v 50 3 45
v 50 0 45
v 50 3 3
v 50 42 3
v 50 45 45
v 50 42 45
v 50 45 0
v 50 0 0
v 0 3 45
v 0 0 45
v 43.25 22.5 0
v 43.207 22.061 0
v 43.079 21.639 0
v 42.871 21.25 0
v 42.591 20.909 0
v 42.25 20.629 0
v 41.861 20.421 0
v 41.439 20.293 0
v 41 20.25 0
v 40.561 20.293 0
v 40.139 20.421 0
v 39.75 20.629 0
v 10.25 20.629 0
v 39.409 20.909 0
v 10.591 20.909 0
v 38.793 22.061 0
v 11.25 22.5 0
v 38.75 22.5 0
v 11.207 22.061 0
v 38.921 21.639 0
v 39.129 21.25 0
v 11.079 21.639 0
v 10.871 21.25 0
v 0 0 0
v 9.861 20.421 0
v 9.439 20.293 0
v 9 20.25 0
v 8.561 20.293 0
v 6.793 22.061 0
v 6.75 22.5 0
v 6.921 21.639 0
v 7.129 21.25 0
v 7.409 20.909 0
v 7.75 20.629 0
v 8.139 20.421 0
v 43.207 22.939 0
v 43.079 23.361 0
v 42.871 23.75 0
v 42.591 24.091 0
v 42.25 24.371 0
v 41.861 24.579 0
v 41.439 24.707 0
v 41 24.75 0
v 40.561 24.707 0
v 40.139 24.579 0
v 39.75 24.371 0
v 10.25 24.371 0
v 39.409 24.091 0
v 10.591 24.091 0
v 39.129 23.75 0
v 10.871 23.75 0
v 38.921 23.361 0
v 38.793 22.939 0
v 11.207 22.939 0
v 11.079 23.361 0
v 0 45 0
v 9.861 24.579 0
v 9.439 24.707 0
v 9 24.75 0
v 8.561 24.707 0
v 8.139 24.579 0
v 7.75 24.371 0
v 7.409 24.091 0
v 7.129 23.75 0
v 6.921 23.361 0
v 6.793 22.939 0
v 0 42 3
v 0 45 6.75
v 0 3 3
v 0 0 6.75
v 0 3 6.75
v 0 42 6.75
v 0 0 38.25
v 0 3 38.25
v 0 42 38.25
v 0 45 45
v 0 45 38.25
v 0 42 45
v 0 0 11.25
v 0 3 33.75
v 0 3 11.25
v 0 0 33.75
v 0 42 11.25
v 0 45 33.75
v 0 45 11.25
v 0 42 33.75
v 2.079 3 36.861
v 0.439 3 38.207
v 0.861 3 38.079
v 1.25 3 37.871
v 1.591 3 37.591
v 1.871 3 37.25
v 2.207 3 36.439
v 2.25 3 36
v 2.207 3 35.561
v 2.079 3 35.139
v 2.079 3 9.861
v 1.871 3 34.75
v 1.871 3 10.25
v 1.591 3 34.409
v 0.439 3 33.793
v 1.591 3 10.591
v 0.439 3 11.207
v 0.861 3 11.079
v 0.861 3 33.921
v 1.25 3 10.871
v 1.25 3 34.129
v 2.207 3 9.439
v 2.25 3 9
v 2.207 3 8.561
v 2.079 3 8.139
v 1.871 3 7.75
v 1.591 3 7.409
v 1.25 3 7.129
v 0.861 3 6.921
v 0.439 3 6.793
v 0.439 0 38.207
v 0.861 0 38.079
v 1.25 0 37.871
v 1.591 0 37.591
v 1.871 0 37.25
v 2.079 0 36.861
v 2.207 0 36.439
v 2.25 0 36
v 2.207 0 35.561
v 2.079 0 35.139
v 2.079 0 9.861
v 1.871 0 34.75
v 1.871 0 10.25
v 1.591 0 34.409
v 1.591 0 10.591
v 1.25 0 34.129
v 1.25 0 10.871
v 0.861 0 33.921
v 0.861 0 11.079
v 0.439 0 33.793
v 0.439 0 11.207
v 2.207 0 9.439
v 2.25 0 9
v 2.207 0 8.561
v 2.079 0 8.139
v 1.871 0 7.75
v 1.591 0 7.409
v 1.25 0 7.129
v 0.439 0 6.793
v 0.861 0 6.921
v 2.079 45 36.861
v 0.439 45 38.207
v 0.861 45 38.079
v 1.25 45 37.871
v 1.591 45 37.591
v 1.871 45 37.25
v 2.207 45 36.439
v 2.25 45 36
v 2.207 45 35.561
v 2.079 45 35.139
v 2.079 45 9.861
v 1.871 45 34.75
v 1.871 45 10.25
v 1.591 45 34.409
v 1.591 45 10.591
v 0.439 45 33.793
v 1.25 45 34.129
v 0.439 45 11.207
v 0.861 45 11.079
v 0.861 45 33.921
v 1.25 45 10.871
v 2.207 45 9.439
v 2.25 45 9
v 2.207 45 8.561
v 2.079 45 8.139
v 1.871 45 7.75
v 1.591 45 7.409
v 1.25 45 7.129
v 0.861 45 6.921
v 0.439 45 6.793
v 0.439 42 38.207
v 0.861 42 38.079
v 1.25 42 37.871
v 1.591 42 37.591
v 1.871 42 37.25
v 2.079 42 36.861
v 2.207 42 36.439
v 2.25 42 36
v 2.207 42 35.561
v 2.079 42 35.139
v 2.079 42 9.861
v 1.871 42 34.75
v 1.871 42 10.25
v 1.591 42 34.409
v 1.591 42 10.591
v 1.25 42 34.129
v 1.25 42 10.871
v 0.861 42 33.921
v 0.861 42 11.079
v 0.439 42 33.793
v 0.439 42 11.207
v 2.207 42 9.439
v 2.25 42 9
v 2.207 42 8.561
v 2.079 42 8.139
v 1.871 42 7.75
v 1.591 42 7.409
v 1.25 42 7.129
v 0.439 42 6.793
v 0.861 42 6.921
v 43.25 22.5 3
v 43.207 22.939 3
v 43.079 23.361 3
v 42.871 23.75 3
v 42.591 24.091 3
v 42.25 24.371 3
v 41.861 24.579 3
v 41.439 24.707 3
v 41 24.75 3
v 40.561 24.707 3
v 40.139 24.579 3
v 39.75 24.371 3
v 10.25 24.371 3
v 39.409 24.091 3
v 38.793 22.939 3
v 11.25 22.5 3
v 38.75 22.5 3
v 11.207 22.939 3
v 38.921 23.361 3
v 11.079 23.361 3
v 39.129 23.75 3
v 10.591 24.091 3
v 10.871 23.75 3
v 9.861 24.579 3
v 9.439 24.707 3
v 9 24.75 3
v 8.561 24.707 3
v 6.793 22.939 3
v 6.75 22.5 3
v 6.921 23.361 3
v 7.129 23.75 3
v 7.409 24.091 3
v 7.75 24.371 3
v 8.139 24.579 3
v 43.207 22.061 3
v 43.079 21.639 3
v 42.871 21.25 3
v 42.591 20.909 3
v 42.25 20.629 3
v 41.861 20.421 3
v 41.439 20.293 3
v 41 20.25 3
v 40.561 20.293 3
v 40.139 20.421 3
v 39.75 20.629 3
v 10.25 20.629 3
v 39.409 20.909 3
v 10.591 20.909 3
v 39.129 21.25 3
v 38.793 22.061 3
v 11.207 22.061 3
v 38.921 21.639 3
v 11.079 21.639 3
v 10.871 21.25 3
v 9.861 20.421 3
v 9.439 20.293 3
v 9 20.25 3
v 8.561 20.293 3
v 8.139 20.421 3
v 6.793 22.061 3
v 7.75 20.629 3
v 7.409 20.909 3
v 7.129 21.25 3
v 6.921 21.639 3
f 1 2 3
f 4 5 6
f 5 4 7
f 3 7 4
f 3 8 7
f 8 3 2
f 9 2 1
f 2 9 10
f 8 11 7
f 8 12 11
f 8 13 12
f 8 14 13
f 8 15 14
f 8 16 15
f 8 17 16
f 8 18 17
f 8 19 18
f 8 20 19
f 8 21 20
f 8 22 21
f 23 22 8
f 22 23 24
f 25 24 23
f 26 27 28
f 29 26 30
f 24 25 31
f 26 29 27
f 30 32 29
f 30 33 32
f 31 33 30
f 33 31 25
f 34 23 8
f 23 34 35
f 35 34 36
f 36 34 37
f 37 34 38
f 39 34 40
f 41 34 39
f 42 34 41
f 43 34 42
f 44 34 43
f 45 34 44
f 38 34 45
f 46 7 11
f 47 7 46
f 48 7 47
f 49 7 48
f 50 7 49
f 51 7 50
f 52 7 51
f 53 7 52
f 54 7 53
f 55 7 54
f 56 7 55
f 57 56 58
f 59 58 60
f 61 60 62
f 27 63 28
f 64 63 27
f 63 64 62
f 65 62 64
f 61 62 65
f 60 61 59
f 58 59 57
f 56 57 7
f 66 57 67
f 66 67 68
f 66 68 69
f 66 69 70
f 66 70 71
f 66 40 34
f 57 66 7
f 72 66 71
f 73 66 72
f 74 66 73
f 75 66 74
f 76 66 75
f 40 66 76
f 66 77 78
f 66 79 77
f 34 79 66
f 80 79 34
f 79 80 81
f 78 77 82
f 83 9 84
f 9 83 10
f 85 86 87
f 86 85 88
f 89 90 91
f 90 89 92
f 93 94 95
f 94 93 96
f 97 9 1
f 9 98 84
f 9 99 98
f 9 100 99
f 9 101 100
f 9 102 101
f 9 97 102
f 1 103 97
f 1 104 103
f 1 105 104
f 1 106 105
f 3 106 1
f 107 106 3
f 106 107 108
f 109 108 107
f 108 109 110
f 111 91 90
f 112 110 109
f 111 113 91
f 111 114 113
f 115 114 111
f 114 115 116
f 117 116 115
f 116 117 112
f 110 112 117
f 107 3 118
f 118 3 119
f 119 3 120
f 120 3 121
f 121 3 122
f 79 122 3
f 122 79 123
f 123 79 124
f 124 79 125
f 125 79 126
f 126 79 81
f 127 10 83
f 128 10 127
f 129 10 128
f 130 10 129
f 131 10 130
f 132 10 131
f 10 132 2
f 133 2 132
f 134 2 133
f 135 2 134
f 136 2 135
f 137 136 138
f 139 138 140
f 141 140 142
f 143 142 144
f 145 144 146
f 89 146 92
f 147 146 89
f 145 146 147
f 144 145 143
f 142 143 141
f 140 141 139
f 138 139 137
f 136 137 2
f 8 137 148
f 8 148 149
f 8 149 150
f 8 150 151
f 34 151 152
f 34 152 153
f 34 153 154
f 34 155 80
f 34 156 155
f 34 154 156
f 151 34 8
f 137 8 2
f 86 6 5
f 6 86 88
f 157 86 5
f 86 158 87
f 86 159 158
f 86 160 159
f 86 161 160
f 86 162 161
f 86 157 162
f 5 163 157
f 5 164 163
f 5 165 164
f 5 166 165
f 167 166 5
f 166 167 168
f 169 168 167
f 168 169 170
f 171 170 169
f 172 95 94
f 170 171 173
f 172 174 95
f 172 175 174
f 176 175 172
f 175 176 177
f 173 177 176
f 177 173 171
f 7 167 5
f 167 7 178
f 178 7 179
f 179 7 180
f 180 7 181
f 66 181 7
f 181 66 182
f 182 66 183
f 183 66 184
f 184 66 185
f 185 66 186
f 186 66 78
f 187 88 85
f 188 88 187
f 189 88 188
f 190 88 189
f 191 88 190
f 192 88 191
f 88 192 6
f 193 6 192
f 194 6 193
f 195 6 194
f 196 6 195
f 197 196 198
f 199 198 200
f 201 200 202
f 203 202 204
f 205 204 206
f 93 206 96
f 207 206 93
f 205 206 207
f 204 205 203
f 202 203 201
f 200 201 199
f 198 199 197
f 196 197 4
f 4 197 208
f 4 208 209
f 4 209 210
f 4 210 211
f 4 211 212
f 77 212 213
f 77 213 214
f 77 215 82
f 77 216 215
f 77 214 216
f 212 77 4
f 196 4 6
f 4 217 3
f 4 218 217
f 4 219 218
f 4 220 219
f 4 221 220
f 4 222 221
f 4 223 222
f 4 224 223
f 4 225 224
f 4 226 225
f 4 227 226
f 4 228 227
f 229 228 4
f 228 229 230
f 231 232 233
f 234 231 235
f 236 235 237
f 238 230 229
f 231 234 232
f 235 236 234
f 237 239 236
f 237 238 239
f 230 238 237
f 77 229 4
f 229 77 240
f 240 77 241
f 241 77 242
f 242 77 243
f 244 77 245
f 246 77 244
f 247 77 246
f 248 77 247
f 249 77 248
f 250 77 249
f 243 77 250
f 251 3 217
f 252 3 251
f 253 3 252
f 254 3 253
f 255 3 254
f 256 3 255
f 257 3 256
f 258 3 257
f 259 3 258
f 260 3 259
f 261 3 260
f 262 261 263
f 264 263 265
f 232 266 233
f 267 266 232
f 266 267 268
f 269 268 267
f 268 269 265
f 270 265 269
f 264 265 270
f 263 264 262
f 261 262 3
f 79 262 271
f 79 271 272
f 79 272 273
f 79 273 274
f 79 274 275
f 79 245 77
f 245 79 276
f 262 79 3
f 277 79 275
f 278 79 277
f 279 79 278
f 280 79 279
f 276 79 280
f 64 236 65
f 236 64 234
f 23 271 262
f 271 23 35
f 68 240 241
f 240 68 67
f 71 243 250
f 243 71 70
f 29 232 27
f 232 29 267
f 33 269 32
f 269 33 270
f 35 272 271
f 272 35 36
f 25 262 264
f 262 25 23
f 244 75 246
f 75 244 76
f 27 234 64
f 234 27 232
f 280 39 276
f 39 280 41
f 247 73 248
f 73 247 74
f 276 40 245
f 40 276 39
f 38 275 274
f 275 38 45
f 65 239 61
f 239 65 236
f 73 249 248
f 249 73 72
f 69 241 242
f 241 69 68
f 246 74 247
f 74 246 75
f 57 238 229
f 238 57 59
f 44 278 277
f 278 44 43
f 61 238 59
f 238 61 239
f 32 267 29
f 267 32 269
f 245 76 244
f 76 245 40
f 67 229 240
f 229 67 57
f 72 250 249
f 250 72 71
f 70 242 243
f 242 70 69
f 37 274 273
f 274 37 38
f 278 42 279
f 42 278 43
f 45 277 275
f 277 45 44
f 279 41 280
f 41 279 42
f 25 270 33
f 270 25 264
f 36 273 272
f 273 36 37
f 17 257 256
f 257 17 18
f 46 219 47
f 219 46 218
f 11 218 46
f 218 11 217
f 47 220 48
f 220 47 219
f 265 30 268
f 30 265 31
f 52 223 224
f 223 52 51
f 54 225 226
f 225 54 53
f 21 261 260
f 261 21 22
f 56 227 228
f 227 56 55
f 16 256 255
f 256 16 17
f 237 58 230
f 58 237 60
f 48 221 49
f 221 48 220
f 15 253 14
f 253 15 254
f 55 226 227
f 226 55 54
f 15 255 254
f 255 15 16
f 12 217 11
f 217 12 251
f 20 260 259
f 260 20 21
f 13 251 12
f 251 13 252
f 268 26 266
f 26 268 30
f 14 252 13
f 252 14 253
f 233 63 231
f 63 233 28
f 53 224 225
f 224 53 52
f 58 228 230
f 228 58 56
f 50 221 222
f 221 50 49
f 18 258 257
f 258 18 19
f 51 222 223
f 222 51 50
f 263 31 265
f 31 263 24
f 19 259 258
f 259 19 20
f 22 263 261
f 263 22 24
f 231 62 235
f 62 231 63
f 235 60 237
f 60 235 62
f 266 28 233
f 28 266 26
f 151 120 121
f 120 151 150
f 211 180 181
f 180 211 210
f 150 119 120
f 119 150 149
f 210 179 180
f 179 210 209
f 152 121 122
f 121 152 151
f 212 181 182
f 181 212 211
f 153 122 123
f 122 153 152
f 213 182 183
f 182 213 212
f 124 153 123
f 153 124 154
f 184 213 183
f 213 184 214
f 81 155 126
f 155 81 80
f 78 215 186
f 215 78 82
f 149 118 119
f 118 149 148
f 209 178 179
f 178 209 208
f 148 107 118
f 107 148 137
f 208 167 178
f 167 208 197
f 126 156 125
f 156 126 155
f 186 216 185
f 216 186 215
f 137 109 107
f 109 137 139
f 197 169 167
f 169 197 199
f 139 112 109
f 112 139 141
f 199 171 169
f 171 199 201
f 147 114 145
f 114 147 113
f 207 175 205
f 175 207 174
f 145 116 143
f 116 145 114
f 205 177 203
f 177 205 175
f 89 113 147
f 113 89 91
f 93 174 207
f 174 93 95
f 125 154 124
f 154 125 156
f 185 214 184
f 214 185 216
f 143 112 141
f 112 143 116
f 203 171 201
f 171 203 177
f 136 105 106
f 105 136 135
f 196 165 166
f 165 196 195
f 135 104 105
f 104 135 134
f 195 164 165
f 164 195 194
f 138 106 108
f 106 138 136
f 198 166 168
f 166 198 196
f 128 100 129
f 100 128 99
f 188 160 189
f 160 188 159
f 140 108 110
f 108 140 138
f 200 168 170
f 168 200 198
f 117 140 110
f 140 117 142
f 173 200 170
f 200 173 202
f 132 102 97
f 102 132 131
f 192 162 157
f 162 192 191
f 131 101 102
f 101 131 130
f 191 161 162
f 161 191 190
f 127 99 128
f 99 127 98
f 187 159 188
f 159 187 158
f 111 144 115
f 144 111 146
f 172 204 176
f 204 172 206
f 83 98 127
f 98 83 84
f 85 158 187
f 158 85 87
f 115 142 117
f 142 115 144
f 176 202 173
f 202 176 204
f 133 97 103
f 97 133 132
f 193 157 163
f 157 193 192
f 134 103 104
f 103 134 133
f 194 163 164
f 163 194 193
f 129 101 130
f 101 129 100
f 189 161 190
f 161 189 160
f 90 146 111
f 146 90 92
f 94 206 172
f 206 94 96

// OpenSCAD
$fn = 32;

// ----------------------------------------------------------------------
// U-bracket: 50 x 45 x 45 mm
// ----------------------------------------------------------------------

// --- parameters (mm) ---
length = 50;              // outer length, X
width = 45;               // outer width, Y
height = 45;              // upright height, Z
thick = 3;                // wall thickness
hole_d = 4.5;             // clearance for M4

module hole_z(px, py) {
  translate([px, py, -0.5]) cylinder(h = thick + 1, d = hole_d);
}
module hole_y_pz(pz) {
  /* through both uprights along Y */
  translate([0, -0.5, pz]) rotate([-90, 0, 0]) cylinder(h = width + 1, d = hole_d);
}

module base() {
  cube([length, width, thick]);
}

module uprights() {
  cube([length, thick, height]);
  translate([0, width - thick, 0]) cube([length, thick, height]);
}

difference() {
  union() {
    base();
    uprights();
  }
  hole_z(9, 22.5);
  hole_z(41, 22.5);
  hole_y_pz(9);
  hole_y_pz(36);
}
